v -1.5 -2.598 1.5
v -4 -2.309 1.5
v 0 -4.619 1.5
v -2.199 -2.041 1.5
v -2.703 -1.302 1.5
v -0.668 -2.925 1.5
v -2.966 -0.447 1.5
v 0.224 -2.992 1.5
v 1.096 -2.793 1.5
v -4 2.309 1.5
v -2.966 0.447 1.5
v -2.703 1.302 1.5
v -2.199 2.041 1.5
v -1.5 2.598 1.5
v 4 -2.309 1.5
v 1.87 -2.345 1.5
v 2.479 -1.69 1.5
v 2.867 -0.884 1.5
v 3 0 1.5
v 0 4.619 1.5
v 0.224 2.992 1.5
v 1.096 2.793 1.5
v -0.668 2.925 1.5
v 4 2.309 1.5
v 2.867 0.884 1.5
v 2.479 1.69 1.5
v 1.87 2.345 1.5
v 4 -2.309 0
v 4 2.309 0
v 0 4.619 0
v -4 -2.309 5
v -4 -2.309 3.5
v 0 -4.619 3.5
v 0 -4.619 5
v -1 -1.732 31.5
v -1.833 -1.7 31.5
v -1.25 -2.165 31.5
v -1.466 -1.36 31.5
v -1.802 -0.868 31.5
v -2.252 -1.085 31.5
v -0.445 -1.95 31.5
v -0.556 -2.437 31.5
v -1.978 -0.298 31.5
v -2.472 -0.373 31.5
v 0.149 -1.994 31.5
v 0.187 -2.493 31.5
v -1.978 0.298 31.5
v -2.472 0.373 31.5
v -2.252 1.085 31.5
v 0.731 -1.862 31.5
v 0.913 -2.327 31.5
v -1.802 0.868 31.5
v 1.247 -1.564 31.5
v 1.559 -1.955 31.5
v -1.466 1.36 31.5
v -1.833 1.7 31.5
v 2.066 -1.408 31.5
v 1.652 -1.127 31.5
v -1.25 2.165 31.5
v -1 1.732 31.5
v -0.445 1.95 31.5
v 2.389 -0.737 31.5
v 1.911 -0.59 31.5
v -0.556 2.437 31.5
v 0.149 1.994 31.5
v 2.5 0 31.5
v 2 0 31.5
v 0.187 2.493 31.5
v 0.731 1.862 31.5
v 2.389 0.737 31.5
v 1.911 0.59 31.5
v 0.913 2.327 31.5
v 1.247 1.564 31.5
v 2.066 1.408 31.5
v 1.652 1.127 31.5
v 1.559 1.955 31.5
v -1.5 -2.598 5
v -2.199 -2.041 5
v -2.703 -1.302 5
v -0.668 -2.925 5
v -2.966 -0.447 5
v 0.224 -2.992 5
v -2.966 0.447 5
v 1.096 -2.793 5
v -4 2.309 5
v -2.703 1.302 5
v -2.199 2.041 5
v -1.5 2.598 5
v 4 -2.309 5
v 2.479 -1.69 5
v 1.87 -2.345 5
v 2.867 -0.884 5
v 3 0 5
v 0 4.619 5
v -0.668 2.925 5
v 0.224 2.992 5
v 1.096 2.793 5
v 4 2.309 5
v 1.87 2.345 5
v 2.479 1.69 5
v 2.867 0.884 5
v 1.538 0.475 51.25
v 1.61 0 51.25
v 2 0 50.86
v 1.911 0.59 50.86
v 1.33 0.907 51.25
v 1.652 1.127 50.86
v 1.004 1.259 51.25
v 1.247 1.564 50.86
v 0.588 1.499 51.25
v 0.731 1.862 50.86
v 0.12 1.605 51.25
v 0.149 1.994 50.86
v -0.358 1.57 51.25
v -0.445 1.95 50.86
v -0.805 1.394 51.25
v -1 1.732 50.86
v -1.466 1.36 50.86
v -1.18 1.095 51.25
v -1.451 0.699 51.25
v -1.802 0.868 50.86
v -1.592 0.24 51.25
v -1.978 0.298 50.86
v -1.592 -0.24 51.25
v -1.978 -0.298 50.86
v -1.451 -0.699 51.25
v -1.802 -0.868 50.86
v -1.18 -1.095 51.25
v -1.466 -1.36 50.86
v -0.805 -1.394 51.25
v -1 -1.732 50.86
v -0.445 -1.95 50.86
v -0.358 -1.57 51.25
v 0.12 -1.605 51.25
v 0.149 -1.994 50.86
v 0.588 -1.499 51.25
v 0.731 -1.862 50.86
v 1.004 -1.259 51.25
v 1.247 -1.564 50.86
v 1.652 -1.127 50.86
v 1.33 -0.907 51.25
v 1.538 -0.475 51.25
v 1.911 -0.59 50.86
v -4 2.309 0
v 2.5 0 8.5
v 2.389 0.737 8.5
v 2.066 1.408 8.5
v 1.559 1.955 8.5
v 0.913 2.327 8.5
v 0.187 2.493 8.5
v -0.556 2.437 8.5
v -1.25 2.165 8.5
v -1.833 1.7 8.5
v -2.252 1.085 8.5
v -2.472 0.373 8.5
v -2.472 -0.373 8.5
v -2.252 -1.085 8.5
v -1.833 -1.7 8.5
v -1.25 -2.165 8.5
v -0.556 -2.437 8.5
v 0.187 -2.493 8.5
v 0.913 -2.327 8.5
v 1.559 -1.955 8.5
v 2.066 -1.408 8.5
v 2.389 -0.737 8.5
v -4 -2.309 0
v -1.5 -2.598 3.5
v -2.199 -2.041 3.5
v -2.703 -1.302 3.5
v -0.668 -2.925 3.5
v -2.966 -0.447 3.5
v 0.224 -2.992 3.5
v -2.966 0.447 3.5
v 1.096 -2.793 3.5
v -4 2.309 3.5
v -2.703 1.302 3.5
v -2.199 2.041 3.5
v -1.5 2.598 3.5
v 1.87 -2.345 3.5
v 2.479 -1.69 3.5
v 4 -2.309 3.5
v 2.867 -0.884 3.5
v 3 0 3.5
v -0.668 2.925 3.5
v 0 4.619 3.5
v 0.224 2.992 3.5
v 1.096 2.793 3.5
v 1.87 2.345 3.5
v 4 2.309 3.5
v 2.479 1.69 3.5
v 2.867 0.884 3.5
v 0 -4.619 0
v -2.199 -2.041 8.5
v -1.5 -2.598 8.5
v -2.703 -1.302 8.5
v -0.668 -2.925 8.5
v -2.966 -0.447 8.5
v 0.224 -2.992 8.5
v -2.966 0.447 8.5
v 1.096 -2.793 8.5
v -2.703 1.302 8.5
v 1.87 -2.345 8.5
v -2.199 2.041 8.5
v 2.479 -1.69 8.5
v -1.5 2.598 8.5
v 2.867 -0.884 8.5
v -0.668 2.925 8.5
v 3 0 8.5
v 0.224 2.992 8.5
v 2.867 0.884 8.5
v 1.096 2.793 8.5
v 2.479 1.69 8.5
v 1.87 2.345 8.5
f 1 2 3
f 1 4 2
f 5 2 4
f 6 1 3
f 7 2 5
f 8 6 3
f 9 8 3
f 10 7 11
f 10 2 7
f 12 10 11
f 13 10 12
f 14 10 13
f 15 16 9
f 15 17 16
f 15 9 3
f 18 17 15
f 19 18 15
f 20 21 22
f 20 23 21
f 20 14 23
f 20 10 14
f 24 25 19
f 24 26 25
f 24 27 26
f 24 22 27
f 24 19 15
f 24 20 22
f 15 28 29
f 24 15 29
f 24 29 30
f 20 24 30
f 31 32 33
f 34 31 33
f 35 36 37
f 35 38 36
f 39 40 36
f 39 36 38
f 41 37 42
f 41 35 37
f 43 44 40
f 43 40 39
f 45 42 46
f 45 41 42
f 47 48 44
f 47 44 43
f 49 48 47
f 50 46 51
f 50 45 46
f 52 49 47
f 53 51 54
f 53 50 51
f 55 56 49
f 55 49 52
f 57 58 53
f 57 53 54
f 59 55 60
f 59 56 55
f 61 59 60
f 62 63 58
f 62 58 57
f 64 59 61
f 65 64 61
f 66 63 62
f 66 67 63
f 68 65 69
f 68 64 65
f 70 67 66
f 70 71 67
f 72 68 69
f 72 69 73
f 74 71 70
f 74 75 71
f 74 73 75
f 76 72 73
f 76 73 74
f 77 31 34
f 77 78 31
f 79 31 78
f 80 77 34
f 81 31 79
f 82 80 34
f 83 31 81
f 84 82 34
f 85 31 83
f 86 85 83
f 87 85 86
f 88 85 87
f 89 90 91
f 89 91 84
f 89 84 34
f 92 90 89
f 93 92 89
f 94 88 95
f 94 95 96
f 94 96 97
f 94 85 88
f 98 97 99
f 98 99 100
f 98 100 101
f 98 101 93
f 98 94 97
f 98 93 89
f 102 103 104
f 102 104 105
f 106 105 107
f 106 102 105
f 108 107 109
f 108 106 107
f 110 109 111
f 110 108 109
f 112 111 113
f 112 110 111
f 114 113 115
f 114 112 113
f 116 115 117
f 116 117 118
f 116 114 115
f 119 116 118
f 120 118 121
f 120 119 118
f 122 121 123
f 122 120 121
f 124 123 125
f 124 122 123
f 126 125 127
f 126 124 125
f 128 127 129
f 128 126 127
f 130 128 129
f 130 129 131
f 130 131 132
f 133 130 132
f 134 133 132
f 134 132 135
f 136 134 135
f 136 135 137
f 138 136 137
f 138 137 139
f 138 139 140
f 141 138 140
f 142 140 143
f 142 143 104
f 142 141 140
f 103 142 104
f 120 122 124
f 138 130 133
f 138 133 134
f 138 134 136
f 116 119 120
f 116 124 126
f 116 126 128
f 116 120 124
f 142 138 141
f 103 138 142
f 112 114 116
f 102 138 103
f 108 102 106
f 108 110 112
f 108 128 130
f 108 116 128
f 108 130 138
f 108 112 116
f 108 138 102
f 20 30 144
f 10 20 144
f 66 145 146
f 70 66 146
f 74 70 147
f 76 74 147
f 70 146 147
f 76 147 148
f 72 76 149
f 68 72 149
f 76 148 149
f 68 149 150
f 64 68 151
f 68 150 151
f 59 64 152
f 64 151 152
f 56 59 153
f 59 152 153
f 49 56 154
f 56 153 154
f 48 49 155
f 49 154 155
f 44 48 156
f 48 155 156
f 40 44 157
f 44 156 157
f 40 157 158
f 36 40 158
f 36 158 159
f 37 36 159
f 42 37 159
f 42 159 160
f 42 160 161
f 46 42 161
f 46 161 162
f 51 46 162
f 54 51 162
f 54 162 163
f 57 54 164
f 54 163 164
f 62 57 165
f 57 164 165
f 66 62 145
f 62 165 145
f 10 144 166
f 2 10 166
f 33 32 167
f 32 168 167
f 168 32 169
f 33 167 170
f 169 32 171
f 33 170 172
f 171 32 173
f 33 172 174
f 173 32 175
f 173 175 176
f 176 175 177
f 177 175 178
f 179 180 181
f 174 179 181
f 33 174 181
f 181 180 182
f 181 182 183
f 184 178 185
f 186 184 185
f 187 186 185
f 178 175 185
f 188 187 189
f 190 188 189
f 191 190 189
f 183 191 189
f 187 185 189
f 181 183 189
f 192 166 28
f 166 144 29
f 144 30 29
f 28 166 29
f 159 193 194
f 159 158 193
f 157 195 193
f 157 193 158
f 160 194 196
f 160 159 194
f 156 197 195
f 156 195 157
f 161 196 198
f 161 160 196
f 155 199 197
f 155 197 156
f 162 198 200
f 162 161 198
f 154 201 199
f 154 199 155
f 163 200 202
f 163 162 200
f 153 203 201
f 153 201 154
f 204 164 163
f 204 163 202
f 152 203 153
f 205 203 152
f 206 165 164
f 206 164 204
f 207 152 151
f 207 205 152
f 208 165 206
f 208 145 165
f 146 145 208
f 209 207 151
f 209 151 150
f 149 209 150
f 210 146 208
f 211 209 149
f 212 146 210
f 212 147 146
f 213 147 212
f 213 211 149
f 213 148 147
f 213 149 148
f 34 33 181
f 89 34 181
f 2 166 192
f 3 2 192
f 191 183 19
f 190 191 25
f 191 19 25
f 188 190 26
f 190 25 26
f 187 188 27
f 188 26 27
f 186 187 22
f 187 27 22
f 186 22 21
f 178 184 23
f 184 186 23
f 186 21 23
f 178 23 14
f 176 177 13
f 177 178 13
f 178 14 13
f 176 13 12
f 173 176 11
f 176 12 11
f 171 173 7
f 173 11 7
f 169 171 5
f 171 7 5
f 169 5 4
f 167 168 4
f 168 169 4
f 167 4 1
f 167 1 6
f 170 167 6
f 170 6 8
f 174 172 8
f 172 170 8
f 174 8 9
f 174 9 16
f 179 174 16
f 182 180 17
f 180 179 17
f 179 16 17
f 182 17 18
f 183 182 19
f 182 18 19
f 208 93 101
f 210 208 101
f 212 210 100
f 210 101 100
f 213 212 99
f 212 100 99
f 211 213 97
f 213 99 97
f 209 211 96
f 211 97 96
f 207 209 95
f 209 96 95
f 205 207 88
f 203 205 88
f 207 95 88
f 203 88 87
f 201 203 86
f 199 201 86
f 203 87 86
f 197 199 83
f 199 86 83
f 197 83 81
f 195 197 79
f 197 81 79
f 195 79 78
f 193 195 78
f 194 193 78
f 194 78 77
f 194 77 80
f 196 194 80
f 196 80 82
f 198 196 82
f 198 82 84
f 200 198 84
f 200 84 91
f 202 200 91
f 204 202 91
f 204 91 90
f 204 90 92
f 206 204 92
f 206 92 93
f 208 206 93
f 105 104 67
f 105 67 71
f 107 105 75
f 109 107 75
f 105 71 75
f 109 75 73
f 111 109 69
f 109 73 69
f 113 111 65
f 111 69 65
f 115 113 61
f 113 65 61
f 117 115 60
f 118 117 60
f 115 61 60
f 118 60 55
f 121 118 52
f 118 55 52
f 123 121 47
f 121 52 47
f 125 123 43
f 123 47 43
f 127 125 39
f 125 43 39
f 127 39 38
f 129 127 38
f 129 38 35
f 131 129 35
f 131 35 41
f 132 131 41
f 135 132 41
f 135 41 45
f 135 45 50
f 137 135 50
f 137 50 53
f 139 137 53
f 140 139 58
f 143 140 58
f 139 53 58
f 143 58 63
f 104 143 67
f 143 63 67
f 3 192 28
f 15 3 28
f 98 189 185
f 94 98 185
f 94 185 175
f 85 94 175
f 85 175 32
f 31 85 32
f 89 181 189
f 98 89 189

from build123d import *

# Parameters (mm, degrees)
EXTRUDE_1_DEPTH = 1.5
SKETCH_2_R      = 3
EXTRUDE_2_DEPTH = 7
EXTRUDE_START   = 3.5
EXTRUDE_3_DEPTH = 1.5
SKETCH_3_R      = 2.5
EXTRUDE_4_DEPTH = 23
SKETCH_4_R      = 2
EXTRUDE_5_DEPTH = 19.75
CHAMFER_1_SIZE  = 0.39


with BuildPart() as part:
    # Эскиз1 → Бобышка-Вытянуть1 (new body)
    with BuildSketch(Plane.XY):
        Polygon((-4, 2.309401077), (-4, -2.309401077), (0, -4.618802154), (4, -2.309401077), (4, 2.309401077), (0, 4.618802154), align=None)
    extrude(amount=EXTRUDE_1_DEPTH)

    # Эскиз2 → Бобышка-Вытянуть2 (add)
    with BuildSketch(Plane.XY.offset(1.5)):
        Circle(SKETCH_2_R)
    extrude(amount=EXTRUDE_2_DEPTH)

    # Эскиз1<2> → Бобышка-Вытянуть3 (add)
    with BuildSketch(Plane.XY.offset(EXTRUDE_START)):
        Polygon((-4, 2.309401077), (-4, -2.309401077), (0, -4.618802154), (4, -2.309401077), (4, 2.309401077), (0, 4.618802154), align=None)
    extrude(amount=EXTRUDE_3_DEPTH)

    # Эскиз3 → Бобышка-Вытянуть4 (add)
    with BuildSketch(Plane.XY.offset(8.5)):
        Circle(SKETCH_3_R)
    extrude(amount=EXTRUDE_4_DEPTH)

    # Эскиз4 → Бобышка-Вытянуть5 (add)
    with BuildSketch(Plane.XY.offset(31.5)):
        Circle(SKETCH_4_R)
    extrude(amount=EXTRUDE_5_DEPTH)

    # Фаска1
    chamfer_1_edges = [part.edges().sort_by_distance(p)[0] for p in [
        (-2, 0, 51.25),
    ]]
    chamfer(chamfer_1_edges, length=CHAMFER_1_SIZE)


solid = part.part
